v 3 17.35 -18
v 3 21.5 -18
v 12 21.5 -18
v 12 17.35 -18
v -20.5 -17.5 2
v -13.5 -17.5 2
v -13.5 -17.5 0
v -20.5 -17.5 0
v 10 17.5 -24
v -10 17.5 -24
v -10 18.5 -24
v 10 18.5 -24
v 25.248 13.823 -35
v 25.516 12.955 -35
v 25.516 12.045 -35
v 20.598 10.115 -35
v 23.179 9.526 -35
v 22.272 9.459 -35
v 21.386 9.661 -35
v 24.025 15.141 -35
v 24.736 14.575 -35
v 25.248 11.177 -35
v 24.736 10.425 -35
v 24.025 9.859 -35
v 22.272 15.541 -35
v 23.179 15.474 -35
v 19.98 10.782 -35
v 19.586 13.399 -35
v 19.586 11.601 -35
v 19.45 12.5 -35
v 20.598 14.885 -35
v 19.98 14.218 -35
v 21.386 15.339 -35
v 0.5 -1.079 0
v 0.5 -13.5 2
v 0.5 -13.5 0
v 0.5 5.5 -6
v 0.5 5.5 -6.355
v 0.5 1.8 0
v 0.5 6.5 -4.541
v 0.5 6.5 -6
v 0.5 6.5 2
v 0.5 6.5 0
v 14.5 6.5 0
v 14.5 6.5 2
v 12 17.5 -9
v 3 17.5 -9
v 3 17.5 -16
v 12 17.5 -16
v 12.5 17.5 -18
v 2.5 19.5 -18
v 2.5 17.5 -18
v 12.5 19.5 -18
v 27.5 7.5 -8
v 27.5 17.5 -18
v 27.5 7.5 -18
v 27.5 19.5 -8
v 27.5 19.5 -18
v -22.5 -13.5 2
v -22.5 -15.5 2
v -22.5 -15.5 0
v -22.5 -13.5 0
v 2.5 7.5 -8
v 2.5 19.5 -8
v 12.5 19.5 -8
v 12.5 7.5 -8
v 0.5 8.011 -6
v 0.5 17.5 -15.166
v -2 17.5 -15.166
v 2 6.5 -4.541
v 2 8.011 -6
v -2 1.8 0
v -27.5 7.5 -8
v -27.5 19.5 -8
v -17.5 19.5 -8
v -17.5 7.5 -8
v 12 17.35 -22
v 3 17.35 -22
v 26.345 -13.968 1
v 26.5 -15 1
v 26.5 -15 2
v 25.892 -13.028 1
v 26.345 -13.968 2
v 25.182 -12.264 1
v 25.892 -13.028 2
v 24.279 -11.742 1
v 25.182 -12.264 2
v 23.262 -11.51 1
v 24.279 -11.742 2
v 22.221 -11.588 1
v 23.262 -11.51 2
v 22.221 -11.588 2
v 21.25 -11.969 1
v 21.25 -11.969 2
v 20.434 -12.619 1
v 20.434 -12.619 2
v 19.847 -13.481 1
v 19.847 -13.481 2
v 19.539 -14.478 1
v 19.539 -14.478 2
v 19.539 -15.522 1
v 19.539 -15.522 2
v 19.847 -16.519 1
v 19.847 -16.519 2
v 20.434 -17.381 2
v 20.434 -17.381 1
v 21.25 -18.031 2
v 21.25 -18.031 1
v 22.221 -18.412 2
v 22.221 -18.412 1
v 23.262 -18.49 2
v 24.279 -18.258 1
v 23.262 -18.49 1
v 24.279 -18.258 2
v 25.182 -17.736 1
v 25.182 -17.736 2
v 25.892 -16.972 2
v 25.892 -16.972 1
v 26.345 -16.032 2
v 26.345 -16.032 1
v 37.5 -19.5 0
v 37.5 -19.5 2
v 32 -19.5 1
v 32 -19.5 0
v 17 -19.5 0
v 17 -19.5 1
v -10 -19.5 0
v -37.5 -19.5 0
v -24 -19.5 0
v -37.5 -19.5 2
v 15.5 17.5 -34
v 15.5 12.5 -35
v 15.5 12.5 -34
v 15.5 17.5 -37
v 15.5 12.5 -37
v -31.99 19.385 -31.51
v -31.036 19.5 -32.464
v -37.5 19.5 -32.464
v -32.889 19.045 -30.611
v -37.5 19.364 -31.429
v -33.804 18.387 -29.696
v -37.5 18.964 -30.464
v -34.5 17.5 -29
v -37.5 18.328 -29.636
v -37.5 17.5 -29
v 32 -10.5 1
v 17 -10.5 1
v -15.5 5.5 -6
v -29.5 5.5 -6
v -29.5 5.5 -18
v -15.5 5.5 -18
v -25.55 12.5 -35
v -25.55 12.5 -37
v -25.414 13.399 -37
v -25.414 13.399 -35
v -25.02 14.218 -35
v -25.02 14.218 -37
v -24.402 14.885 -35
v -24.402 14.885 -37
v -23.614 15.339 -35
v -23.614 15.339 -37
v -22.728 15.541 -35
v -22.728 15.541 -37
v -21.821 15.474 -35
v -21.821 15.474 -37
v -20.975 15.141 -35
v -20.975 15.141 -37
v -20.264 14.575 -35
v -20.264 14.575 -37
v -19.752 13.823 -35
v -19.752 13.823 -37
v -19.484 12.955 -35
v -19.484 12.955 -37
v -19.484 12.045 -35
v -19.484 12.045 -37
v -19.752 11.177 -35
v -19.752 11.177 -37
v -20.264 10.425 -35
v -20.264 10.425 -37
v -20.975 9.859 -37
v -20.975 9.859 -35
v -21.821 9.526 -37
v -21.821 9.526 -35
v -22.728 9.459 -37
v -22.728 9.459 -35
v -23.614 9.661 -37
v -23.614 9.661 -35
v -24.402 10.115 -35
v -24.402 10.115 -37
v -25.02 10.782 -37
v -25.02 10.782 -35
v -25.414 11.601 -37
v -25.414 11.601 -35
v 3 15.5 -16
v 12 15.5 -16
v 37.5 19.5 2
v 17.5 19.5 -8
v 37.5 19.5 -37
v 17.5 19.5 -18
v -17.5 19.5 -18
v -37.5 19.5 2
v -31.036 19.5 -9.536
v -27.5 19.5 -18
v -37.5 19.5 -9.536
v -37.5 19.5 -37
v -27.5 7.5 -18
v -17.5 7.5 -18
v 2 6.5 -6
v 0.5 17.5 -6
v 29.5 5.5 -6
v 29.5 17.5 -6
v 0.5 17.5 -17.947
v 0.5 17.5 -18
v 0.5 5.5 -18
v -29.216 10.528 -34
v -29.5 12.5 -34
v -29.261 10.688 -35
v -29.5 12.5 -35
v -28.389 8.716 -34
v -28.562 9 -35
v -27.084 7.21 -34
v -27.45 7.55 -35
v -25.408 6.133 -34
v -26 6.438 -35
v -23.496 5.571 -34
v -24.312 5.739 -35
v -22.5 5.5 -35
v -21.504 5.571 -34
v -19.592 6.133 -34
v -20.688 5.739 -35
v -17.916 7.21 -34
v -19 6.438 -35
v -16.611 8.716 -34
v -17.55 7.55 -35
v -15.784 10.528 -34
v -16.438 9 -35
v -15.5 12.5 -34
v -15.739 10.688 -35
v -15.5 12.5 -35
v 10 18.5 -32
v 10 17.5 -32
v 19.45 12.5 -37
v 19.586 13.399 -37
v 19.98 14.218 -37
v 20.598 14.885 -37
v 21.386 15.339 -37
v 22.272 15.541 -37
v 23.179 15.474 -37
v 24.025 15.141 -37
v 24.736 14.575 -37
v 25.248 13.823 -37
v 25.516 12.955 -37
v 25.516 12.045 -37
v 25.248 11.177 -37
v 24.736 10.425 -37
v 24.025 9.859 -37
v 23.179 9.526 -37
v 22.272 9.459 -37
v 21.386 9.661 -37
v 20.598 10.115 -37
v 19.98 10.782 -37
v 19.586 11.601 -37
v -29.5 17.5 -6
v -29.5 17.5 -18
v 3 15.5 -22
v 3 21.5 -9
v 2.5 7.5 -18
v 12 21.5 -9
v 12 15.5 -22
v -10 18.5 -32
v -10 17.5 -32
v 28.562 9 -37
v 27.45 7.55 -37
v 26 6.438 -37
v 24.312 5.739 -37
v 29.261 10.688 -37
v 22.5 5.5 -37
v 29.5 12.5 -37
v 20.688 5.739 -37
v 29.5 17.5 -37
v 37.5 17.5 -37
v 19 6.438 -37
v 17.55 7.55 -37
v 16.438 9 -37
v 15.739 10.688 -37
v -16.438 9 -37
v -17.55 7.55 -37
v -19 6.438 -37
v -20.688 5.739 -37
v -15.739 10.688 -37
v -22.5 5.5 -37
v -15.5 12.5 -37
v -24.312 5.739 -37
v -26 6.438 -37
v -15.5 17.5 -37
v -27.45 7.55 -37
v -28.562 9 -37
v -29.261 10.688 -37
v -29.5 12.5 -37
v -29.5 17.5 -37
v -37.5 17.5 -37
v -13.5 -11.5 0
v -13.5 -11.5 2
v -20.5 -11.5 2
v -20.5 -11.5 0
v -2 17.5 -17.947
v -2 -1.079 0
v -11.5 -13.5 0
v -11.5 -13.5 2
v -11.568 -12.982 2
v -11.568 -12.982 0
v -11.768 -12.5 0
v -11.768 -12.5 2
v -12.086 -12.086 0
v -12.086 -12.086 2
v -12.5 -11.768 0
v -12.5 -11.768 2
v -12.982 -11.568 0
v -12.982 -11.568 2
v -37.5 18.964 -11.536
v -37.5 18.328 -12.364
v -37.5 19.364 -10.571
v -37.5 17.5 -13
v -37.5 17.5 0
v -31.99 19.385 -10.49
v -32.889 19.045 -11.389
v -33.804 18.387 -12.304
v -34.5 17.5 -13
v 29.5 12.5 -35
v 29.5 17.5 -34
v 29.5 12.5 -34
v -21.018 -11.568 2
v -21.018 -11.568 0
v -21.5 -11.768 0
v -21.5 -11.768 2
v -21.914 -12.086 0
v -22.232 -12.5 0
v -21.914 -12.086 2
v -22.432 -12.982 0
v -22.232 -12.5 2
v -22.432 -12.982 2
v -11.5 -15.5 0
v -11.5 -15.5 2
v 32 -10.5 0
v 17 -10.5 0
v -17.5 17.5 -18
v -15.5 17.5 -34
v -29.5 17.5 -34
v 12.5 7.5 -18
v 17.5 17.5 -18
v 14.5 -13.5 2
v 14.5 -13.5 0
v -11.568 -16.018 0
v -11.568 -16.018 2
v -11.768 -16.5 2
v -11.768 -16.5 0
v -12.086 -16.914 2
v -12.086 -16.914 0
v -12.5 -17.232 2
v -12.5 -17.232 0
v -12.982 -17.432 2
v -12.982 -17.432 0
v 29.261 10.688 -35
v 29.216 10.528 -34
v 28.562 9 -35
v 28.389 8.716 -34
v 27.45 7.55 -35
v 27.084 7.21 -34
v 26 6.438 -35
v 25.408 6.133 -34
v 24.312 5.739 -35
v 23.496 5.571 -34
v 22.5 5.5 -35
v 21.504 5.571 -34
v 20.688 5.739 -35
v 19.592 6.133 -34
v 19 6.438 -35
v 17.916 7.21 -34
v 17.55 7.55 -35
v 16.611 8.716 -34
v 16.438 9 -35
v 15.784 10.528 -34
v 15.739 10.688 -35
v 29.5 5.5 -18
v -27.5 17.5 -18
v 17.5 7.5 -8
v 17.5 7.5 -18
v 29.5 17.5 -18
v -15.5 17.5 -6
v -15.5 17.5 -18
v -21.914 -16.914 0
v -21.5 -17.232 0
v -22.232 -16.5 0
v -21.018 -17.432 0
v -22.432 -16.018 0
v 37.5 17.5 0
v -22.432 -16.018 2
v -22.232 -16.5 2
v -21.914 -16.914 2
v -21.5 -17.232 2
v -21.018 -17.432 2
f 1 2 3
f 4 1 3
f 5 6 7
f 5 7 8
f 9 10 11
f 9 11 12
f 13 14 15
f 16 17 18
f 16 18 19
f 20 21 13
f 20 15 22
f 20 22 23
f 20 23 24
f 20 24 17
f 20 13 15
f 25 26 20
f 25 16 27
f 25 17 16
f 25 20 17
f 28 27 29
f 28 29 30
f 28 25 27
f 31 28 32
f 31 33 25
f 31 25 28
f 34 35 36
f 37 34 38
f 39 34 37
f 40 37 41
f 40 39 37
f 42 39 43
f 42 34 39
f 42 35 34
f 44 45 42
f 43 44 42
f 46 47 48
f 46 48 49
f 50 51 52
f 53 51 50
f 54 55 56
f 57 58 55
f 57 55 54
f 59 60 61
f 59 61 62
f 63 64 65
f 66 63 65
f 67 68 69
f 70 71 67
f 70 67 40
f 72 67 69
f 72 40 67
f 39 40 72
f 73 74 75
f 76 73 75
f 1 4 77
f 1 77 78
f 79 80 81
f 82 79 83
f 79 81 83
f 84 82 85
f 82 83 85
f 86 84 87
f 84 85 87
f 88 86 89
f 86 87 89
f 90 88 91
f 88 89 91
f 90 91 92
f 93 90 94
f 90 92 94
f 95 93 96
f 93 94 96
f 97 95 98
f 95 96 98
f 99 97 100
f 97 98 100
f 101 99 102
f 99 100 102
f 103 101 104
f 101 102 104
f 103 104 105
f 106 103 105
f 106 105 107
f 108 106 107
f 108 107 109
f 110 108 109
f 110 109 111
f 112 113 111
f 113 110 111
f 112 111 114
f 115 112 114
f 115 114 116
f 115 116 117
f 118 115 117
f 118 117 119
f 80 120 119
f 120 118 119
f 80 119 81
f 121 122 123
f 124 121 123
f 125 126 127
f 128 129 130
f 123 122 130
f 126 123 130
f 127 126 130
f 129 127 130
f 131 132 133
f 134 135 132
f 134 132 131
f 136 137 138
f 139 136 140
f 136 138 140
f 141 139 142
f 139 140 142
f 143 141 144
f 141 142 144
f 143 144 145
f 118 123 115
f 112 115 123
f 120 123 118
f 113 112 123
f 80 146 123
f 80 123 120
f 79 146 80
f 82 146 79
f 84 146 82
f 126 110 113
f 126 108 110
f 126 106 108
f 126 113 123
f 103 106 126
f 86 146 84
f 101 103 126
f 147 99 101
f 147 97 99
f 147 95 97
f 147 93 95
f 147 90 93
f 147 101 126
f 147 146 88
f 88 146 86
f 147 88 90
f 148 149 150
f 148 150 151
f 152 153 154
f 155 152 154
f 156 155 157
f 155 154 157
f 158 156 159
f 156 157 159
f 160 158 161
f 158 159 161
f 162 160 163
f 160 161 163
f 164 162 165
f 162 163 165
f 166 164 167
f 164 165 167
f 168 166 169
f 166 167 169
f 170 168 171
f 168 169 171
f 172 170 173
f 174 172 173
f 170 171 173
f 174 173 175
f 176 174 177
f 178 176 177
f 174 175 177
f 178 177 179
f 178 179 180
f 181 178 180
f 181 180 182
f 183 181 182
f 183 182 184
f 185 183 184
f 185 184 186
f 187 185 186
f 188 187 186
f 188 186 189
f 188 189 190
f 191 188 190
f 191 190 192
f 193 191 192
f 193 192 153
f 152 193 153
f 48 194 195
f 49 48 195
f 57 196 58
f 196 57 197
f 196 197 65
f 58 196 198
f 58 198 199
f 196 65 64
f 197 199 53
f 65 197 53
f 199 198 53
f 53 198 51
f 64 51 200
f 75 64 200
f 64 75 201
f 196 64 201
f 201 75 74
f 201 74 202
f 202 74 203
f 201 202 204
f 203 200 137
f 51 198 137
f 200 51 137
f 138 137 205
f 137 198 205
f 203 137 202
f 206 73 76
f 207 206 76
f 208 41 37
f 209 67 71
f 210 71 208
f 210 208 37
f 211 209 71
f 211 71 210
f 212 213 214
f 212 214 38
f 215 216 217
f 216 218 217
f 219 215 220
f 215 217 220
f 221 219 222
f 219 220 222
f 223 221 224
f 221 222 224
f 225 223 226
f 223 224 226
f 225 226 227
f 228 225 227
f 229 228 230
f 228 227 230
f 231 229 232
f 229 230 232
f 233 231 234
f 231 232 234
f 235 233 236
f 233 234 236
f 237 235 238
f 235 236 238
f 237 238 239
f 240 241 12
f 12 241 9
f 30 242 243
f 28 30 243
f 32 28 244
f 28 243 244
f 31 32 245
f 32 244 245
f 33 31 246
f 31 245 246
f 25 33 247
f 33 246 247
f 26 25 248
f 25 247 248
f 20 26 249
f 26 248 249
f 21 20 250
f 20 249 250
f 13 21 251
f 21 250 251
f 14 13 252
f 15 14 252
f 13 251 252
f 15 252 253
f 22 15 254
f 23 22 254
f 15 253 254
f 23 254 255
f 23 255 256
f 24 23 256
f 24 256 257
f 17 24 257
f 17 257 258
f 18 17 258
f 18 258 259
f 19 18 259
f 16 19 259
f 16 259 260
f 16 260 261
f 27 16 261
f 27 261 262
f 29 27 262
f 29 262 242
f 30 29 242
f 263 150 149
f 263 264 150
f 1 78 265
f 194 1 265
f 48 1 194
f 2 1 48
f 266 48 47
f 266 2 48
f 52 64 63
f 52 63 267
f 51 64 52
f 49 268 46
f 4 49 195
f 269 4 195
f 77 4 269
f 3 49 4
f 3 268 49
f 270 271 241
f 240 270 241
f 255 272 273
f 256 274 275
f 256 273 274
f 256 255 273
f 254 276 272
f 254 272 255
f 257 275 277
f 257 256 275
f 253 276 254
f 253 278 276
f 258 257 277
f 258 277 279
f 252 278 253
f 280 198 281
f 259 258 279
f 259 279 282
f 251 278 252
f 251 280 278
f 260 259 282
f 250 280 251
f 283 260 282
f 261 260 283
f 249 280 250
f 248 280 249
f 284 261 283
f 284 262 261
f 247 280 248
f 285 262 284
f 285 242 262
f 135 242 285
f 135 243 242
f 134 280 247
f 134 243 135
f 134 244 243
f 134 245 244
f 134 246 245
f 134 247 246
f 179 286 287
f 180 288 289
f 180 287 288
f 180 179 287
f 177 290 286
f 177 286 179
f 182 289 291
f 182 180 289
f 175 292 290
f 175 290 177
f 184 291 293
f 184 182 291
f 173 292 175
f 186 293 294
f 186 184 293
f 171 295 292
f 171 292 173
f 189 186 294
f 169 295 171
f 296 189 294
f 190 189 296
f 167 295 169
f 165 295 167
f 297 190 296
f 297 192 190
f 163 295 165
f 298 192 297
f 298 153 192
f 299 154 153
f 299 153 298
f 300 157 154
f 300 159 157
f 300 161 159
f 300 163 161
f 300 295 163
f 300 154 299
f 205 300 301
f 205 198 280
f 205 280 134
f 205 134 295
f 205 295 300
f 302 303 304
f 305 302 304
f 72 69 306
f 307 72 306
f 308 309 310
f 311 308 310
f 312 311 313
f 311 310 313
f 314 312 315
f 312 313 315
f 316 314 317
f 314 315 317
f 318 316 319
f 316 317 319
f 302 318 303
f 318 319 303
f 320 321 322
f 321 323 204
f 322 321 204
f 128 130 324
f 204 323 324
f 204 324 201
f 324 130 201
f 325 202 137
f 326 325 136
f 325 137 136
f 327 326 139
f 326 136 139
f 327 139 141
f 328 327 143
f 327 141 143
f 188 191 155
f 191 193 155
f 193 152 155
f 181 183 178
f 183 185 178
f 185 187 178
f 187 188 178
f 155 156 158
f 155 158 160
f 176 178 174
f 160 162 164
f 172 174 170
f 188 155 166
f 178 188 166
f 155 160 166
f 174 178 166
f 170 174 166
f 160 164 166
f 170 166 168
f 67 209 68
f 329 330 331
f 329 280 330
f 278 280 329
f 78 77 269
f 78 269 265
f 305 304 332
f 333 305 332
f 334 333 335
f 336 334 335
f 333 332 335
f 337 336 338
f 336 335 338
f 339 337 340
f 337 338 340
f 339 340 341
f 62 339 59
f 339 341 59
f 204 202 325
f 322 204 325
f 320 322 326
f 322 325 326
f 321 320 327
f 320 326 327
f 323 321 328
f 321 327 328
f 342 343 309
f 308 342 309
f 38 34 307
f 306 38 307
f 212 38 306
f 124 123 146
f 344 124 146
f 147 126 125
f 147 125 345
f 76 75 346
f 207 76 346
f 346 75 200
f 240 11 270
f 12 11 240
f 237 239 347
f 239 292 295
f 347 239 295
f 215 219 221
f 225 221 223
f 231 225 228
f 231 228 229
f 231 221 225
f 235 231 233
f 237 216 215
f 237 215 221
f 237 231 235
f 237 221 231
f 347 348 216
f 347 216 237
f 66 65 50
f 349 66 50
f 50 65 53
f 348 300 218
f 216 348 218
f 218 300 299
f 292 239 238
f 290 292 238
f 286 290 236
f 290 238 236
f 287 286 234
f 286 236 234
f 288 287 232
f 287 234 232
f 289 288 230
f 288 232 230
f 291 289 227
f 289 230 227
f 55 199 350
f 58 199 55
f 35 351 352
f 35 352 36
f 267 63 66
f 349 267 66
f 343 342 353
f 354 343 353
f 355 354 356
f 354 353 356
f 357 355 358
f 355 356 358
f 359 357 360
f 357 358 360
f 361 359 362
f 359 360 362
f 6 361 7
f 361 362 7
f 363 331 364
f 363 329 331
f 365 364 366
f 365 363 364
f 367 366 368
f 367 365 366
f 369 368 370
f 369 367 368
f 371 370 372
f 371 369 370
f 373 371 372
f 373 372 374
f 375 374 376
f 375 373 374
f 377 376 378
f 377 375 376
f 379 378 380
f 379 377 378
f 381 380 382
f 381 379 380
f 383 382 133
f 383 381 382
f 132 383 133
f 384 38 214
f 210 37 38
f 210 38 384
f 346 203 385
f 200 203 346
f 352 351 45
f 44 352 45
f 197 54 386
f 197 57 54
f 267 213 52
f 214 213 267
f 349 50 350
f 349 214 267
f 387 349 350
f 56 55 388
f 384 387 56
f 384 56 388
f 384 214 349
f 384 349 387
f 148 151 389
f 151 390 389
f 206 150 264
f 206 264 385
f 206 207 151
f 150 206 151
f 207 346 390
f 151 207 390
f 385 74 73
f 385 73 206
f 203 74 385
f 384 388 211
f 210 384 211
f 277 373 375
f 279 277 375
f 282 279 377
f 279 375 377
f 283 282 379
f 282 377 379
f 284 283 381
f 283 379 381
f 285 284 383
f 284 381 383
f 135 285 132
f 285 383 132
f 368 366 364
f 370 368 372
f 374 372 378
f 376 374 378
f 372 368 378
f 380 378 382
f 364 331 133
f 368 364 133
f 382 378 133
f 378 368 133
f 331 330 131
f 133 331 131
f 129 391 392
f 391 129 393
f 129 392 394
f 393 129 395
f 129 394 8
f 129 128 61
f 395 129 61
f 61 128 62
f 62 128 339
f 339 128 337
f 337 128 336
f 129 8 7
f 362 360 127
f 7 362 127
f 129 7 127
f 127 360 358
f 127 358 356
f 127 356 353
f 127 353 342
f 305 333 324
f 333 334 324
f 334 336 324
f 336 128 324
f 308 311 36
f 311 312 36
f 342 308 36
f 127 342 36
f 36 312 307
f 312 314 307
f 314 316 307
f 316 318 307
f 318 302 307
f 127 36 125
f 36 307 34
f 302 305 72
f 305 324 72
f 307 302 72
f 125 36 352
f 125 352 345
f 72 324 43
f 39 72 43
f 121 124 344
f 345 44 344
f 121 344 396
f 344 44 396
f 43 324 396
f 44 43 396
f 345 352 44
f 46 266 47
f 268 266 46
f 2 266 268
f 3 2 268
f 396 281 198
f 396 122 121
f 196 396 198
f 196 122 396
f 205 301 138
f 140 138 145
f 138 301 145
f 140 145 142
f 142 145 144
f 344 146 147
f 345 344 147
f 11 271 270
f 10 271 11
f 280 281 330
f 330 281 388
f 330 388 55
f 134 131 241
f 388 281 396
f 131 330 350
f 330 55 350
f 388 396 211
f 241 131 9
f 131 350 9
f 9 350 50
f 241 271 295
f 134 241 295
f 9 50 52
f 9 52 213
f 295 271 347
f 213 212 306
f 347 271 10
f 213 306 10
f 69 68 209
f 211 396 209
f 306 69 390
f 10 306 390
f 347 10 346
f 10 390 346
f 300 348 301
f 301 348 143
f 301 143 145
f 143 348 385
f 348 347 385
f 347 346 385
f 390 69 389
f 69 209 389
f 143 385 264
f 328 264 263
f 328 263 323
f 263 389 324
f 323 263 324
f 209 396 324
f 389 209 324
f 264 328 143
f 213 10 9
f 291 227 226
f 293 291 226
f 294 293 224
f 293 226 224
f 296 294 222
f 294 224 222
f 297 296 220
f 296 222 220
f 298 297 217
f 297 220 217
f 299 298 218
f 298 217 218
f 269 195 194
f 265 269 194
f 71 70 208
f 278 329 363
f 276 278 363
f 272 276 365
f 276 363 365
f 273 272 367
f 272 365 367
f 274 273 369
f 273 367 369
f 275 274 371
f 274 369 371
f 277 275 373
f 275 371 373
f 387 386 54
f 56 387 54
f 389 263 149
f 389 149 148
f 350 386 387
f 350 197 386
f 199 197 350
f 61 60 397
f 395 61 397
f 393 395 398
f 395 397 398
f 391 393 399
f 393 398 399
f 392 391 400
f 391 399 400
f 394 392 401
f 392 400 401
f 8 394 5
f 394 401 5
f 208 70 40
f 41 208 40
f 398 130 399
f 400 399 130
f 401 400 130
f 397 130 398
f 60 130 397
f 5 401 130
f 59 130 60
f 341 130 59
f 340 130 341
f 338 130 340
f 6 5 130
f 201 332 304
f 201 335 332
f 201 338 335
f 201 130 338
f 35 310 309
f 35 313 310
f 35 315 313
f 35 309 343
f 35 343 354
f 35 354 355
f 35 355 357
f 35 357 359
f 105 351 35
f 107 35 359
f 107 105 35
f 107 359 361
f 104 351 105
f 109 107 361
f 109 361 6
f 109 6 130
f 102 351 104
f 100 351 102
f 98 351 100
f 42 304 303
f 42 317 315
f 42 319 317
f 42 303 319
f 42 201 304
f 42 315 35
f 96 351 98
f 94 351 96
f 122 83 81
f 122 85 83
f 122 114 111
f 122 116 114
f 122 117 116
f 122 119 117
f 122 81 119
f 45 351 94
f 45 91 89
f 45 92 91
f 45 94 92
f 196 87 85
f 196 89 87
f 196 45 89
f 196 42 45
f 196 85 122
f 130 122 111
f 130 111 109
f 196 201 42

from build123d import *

# Parameters (mm, degrees)
SKETCH1_W                 = 75
SKETCH1_H                 = 39
BOSS_EXTRUDE1_DEPTH       = 2
SKETCH2_W                 = 75
SKETCH2_H                 = 2
BOSS_EXTRUDE2_DEPTH       = 38
SKETCH4_R                 = 3.5
SKETCH4_R_2               = 2.25
SKETCH4_W                 = 11
SKETCH4_H                 = 6
CUT_EXTRUDE1_DEPTH        = 2
SKETCH6_W                 = 10
SKETCH6_H                 = 10
CUT_EXTRUDE2_DEPTH        = 2
BOSS_EXTRUDE3_DEPTH       = 10
SKETCH8_W                 = 14
SKETCH8_H                 = 12
BOSS_EXTRUDE4_DEPTH       = 2
SKETCH9_W                 = 10
SKETCH9_H                 = 10
BOSS_EXTRUDE5_DEPTH       = 4
SKETCH10_W                = 9.9
SKETCH10_H                = 9.9
SKETCH10_W_2              = 5.9
SKETCH10_H_2              = 5.9
BOSS_EXTRUDE9_DEPTH       = 2
SKETCH11_W                = 9.9
SKETCH11_H                = 1.85
BOSS_EXTRUDE10_DEPTH      = 4
SKETCH12_R                = 4.25
SKETCH12_R_2              = 2.25
BOSS_EXTRUDE11_DEPTH      = 2
SKETCH16_W                = 14
SKETCH16_H                = 9.5
SKETCH16_W_2              = 11
SKETCH16_H_2              = 6
BOSS_EXTRUDE13_DEPTH      = 2
CUT_EXTRUDE3_DEPTH        = 65.955754172
FILLET1_R                 = 2
FILLET2_R                 = 2
BOSS_EXTRUDE14_DEPTH      = 2
BOSS_EXTRUDE14_DEPTH_BACK = 2
CUT_EXTRUDE4_DEPTH        = 7
CUT_EXTRUDE4_DEPTH_BACK   = 10
SKETCH19_W                = 14
SKETCH19_H                = 20
SKETCH22_W                = 14
SKETCH22_H                = 14
BOSS_EXTRUDE15_DEPTH      = 3
FILLET3_R                 = 7
SKETCH23_R                = 3.05
CUT_EXTRUDE6_DEPTH        = 4
SKETCH24_W                = 1
SKETCH24_H                = 12
BOSS_EXTRUDE16_DEPTH      = 12
SKETCH25_W                = 16.318850604
SKETCH25_H                = 8.975597068
SKETCH25_W_2              = 14
SKETCH25_H_2              = 9.692484115
CUT_EXTRUDE7_DEPTH        = 2
CUT_EXTRUDE8_START        = -2
SKETCH26_R                = 4.25
CUT_EXTRUDE8_DEPTH        = 2
SKETCH27_R                = 2.25
BOSS_EXTRUDE17_DEPTH      = 2
SKETCH28_W                = 85.525995753
SKETCH28_H                = 26.786934063
CUT_EXTRUDE9_DEPTH        = 1
BOSS_EXTRUDE18_DEPTH      = 1
CUT_EXTRUDE10_DEPTH       = 10
CUT_EXTRUDE11_START       = -1
SKETCH31_W                = 15
SKETCH31_H                = 9
SKETCH31_R                = 3.5
CUT_EXTRUDE11_DEPTH       = 1
SKETCH32_W                = 20
SKETCH32_H                = 8
CUT_EXTRUDE12_DEPTH       = 1
BOSS_EXTRUDE19_START      = -1
SKETCH34_W                = 14
SKETCH34_H                = 1
BOSS_EXTRUDE19_DEPTH      = 1
SKETCH35_W                = 3
SKETCH35_H                = 16
CUT_EXTRUDE13_DEPTH       = 66.545785524
FILLET4_R                 = 4
SKETCH36_W                = 0.4
SKETCH36_H                = 4
CUT_EXTRUDE14_DEPTH       = 10
SKETCH38_W                = 9.5
SKETCH38_H                = 7.5
CUT_EXTRUDE15_DEPTH       = 2
CUT_EXTRUDE16_DEPTH       = 10


# Some blends are built 0.0001 mm under size
with BuildPart() as part:
    # Sketch1 → Boss-Extrude1 (new body)
    with BuildSketch(Plane.XY):
        Rectangle(SKETCH1_W, SKETCH1_H)
    extrude(amount=BOSS_EXTRUDE1_DEPTH)

    # Sketch2 → Boss-Extrude2 (add)
    with BuildSketch(Plane(origin=(0, 0, 0), x_dir=(-1, 0, 0), z_dir=(0, 0, -1))):
        with Locations((0, 18.5)):
            Rectangle(SKETCH2_W, SKETCH2_H)
    extrude(amount=BOSS_EXTRUDE2_DEPTH)

    # Sketch4 → Cut-Extrude1 (cut)
    with BuildSketch(Plane.XY.offset(2)):
        with Locations((23, -15)):
            Circle(SKETCH4_R)
        with Locations((23, 4.5)):
            Circle(SKETCH4_R_2)
        with Locations((-17, -14.5)):
            Rectangle(SKETCH4_W, SKETCH4_H)
    extrude(amount=-CUT_EXTRUDE1_DEPTH, mode=Mode.SUBTRACT)

    # Sketch6 → Cut-Extrude2 (cut)
    with BuildSketch(Plane(origin=(0, 19.5, 0), x_dir=(1, 0, 0), z_dir=(0, 1, 0))):
        with Locations((7.5, 13)):
            Rectangle(SKETCH6_W, SKETCH6_H)
        with Locations((22.5, 13)):
            Rectangle(SKETCH6_W, SKETCH6_H)
        with Locations((-22.5, 13)):
            Rectangle(SKETCH6_W, SKETCH6_H)
    extrude(amount=-CUT_EXTRUDE2_DEPTH, mode=Mode.SUBTRACT)

    # Sketch7 → Boss-Extrude3 (add)
    with BuildSketch(Plane.XZ.offset(-17.5)):
        Polygon((17.5, -8), (17.5, -18), (15.5, -18), (15.5, -8), (15.5, -6), (29.5, -6), (29.5, -8), (29.5, -18), (27.5, -18), (27.5, -8), align=None)
        Polygon((2.5, -8), (2.5, -18), (0.5, -18), (0.5, -8), (0.5, -6), (14.5, -6), (14.5, -8), (14.5, -18), (12.5, -18), (12.5, -8), align=None)
        Polygon((-17.5, -8), (-17.5, -18), (-15.5, -18), (-15.5, -8), (-15.5, -6), (-29.5, -6), (-29.5, -8), (-29.5, -18), (-27.5, -18), (-27.5, -8), align=None)
    extrude(amount=BOSS_EXTRUDE3_DEPTH)

    # Sketch8 → Boss-Extrude4 (add)
    with BuildSketch(Plane.XZ.offset(-7.5)):
        with Locations((-22.5, -12)):
            Rectangle(SKETCH8_W, SKETCH8_H)
        with Locations((7.5, -12)):
            Rectangle(SKETCH8_W, SKETCH8_H)
        with Locations((22.5, -12)):
            Rectangle(SKETCH8_W, SKETCH8_H)
    extrude(amount=BOSS_EXTRUDE4_DEPTH)

    # Sketch12 → Boss-Extrude11 (add)
    with BuildSketch(Plane(origin=(0, 0, 0), x_dir=(-1, 0, 0), z_dir=(0, 0, -1))):
        with Locations(Location((-23, 4.5, 0), (0, 0, 180))):
            Circle(SKETCH12_R)
        with Locations(Location((-23, 4.5, 0), (0, 0, 180))):
            Circle(SKETCH12_R_2, mode=Mode.SUBTRACT)
    extrude(amount=BOSS_EXTRUDE11_DEPTH)

    # Sketch16 → Boss-Extrude13 (add)
    with BuildSketch(Plane(origin=(0, 0, 0), x_dir=(-1, 0, 0), z_dir=(0, 0, -1))):
        with Locations((17, -14.75)):
            Rectangle(SKETCH16_W, SKETCH16_H)
        with Locations((17, -14.5)):
            Rectangle(SKETCH16_W_2, SKETCH16_H_2, mode=Mode.SUBTRACT)
    extrude(amount=BOSS_EXTRUDE13_DEPTH)

    # Fillet1
    fillet1_edges = [part.edges().sort_by_distance(p)[0] for p in [
        (-22.5, -17.5, 0),
        (-22.5, -11.5, 0),
        (-11.5, -11.5, 0),
        (-11.5, -17.5, 0),
    ]]
    fillet(fillet1_edges, radius=FILLET1_R)

    # Fillet2
    fillet2_edges = [part.edges().sort_by_distance(p)[0] for p in [
        (-10, -10, -1),
        (-24, -10, -1),
    ]]
    fillet(fillet2_edges, radius=FILLET2_R)

    # Sketch18 → Boss-Extrude14 (add, two sides: drawn at the far end of the back side and taken through both)
    with BuildSketch(Plane.ZY.offset(-BOSS_EXTRUDE14_DEPTH_BACK)):
        Polygon((-15.16634768, 17.5), (0, 1.799618541), (0, -1.079036274), (-17.947087746, 17.5), align=None)
    extrude(amount=BOSS_EXTRUDE14_DEPTH + BOSS_EXTRUDE14_DEPTH_BACK)

    # Sketch19 → Cut-Extrude4 (cut, two sides: drawn at the far end of the back side and taken through both)
    with BuildSketch(Plane(origin=(0, 0, 0), x_dir=(-1, 0, 0), z_dir=(0, 0, -1)).offset(-CUT_EXTRUDE4_DEPTH_BACK)):
        with Locations((-7.5, -3.5)):
            Rectangle(SKETCH19_W, SKETCH19_H)
    extrude(amount=CUT_EXTRUDE4_DEPTH + CUT_EXTRUDE4_DEPTH_BACK, mode=Mode.SUBTRACT)

    # Sketch22 → Boss-Extrude15 (add)
    with BuildSketch(Plane(origin=(0, 0, -38), x_dir=(-1, 0, 0), z_dir=(0, 0, -1))):
        with Locations((-22.5, 12.5)):
            Rectangle(SKETCH22_W, SKETCH22_H)
        with Locations((22.5, 12.5)):
            Rectangle(SKETCH22_W, SKETCH22_H)
    extrude(amount=-BOSS_EXTRUDE15_DEPTH)

    # Fillet3
    fillet3_edges = [part.edges().sort_by_distance(p)[0] for p in [
        (-29.5, 5.5, -36.5),
        (-15.5, 5.5, -36.5),
        (15.5, 5.5, -36.5),
        (29.5, 5.5, -36.5),
    ]]
    fillet(fillet3_edges, radius=FILLET3_R - 0.0001)  # a hair under: the kernel refuses the full size

    # Sketch23 → Cut-Extrude6 (cut)
    with BuildSketch(Plane(origin=(0, 0, -38), x_dir=(-1, 0, 0), z_dir=(0, 0, -1))):
        with Locations((-22.5, 12.5)):
            Circle(SKETCH23_R)
        with Locations((22.5, 12.5)):
            Circle(SKETCH23_R)
    extrude(amount=-CUT_EXTRUDE6_DEPTH, mode=Mode.SUBTRACT)

    # Sketch24 → Boss-Extrude16 (add)
    with BuildSketch(Plane.XZ.offset(-5.5)):
        with Locations((15, -12)):
            Rectangle(SKETCH24_W, SKETCH24_H)
    extrude(amount=-BOSS_EXTRUDE16_DEPTH)

    # Sketch25 → Cut-Extrude7 (cut)
    with BuildSketch(Plane(origin=(0, 0, -2), x_dir=(-1, 0, 0), z_dir=(0, 0, -1))):
        with Locations((-23, -15)):
            Rectangle(SKETCH25_W, SKETCH25_H)
        with Locations((17, -14.653757943)):
            Rectangle(SKETCH25_W_2, SKETCH25_H_2)
    extrude(amount=-CUT_EXTRUDE7_DEPTH, mode=Mode.SUBTRACT)

    # Sketch26 → Cut-Extrude8 (cut)
    with BuildSketch(Plane(origin=(0, 0, -2), x_dir=(-1, 0, 0), z_dir=(0, 0, -1)).offset(CUT_EXTRUDE8_START)):
        with Locations((-23, 4.5)):
            Circle(SKETCH26_R)
    extrude(amount=CUT_EXTRUDE8_DEPTH, mode=Mode.SUBTRACT)

    # Sketch27 → Boss-Extrude17 (add)
    with BuildSketch(Plane.XY.offset(2)):
        with Locations((23, 4.5)):
            Circle(SKETCH27_R)
    extrude(amount=-BOSS_EXTRUDE17_DEPTH)

    # Sketch28 → Cut-Extrude9 (cut)
    with BuildSketch(Plane(origin=(0, 0, -38), x_dir=(-1, 0, 0), z_dir=(0, 0, -1))):
        with Locations((0.270543114, 11.591218851)):
            Rectangle(SKETCH28_W, SKETCH28_H)
    extrude(amount=-CUT_EXTRUDE9_DEPTH, mode=Mode.SUBTRACT)

    # Sketch29 → Boss-Extrude18 (add)
    with BuildSketch(Plane.XY.offset(-35)):
        with BuildLine():
            Line((15.5, 17.5), (29.5, 17.5))
            Line((29.5, 17.5), (29.5, 12.5))
            ThreePointArc((29.5, 12.5), (22.5, 5.5), (15.5, 12.5))
            Line((15.5, 12.5), (15.5, 17.5))
        make_face()
    boss_extrude18 = extrude(amount=BOSS_EXTRUDE18_DEPTH)

    # Mirror1: Boss-Extrude18 across plane
    add(boss_extrude18.mirror(Plane.ZY))

    # Sketch31 → Cut-Extrude11 (cut)
    with BuildSketch(Plane(origin=(0, 0, 0), x_dir=(-1, 0, 0), z_dir=(0, 0, -1)).offset(CUT_EXTRUDE11_START)):
        with Locations((-24.5, -15)):
            Rectangle(SKETCH31_W, SKETCH31_H)
        with Locations(Location((-23, -15, 0), (0, 0, 180))):
            Circle(SKETCH31_R, mode=Mode.SUBTRACT)
    extrude(amount=CUT_EXTRUDE11_DEPTH, mode=Mode.SUBTRACT)

    # Sketch32 → Cut-Extrude12 (cut)
    with BuildSketch(Plane.XZ.offset(-17.5)):
        with Locations((0, -28)):
            Rectangle(SKETCH32_W, SKETCH32_H)
    extrude(amount=-CUT_EXTRUDE12_DEPTH, mode=Mode.SUBTRACT)

    # Sketch34 → Boss-Extrude19 (add)
    with BuildSketch(Plane.XZ.offset(-5.5).offset(BOSS_EXTRUDE19_START)):
        with Locations((7.5, -6.5)):
            Rectangle(SKETCH34_W, SKETCH34_H)
    extrude(amount=BOSS_EXTRUDE19_DEPTH)

    # Sketch35 → Cut-Extrude13 (cut, through all)
    with BuildSketch(Plane(origin=(0, 19.5, 0), x_dir=(1, 0, 0), z_dir=(0, 1, 0))):
        with Locations((-36, 21)):
            Rectangle(SKETCH35_W, SKETCH35_H)
    extrude(amount=-CUT_EXTRUDE13_DEPTH, mode=Mode.SUBTRACT)

    # Fillet4
    # the kernel refuses this fillet: 4 mm, written as the material it takes off along each edge
    with BuildSketch(Plane(origin=(-34.5, 19.5, -13), x_dir=(0, 0, 1), z_dir=(-1, 0, 0)), Plane(origin=(-46.160254038, 19.5, -29), x_dir=(0, 0, -1), z_dir=(1, 0, 0))) as fillet4_piece_1:
        with BuildLine():
            CenterArc((3.464101615, -4), FILLET4_R, 90, 60)
            Line((0, -2), (-0.069282032, -1.96))
            ThreePointArc((-0.069282032, -1.96), (-0.08, -1), (-0.08, 0))
            Line((-0.08, 0), (0, 0.08))
            Line((0, 0.08), (3.464101615, 0.08))
            Line((3.464101615, 0.08), (3.464101615, 0))
        make_face()
    extrude(amount=11.660254038, mode=Mode.SUBTRACT)
    with BuildSketch(Plane(origin=(-34.5, 19.5, -29), x_dir=(1, 0, 0), z_dir=(0, 0, 1))) as fillet4_piece_2:
        with BuildLine():
            CenterArc((3.464101615, -4), FILLET4_R, 90, 60)
            Line((0, -2), (-0.069282032, -1.96))
            ThreePointArc((-0.069282032, -1.96), (-0.08, -1), (-0.08, 0))
            Line((-0.08, 0), (0, 0.08))
            Line((0, 0.08), (3.464101615, 0.08))
            Line((3.464101615, 0.08), (3.464101615, 0))
        make_face()
    extrude(amount=16, mode=Mode.SUBTRACT)
    with BuildSketch(Plane(origin=(-25.839745962, 19.5, -13), x_dir=(0, 0, 1), z_dir=(-1, 0, 0))) as fillet4_piece_3a_section:
        with BuildLine():
            CenterArc((3.464101615, -4), FILLET4_R, 90, 60)
            Line((0, -2), (-0.069282032, -1.96))
            ThreePointArc((-0.069282032, -1.96), (-0.08, -1), (-0.08, 0))
            Line((-0.08, 0), (0, 0.08))
            Line((0, 0.08), (3.464101615, 0.08))
            Line((3.464101615, 0.08), (3.464101615, 0))
        make_face()
    fillet4_piece_3a = extrude(amount=20.320508076, mode=Mode.PRIVATE)
    fillet4_piece_3a = split(fillet4_piece_3a, bisect_by=Plane(origin=(-34.5, 18.981933156, -12.134758217), z_dir=(1, 0, 0)), keep=Keep.TOP, mode=Mode.PRIVATE)
    with BuildSketch(Plane(origin=(-34.5, 19.5, -29), x_dir=(1, 0, 0), z_dir=(0, 0, 1))) as fillet4_piece_3b_section:
        with BuildLine():
            CenterArc((3.464101615, -4), FILLET4_R, 90, 60)
            Line((0, -2), (-0.069282032, -1.96))
            ThreePointArc((-0.069282032, -1.96), (-0.08, -1), (-0.08, 0))
            Line((-0.08, 0), (0, 0.08))
            Line((0, 0.08), (3.464101615, 0.08))
            Line((3.464101615, 0.08), (3.464101615, 0))
        make_face()
    fillet4_piece_3b = extrude(amount=24.660254038, mode=Mode.PRIVATE)
    fillet4_piece_3b = split(fillet4_piece_3b, bisect_by=Plane(origin=(-33.634758217, 18.981933156, -13), z_dir=(0, 0, 1)), keep=Keep.TOP, mode=Mode.PRIVATE)
    fillet4_piece_3 = fillet4_piece_3a & fillet4_piece_3b
    add(fillet4_piece_3, mode=Mode.SUBTRACT)
    with BuildSketch(Plane(origin=(-34.5, 19.5, -37.660254038), x_dir=(1, 0, 0), z_dir=(0, 0, 1))) as fillet4_piece_4a_section:
        with BuildLine():
            CenterArc((3.464101615, -4), FILLET4_R, 90, 60)
            Line((0, -2), (-0.069282032, -1.96))
            ThreePointArc((-0.069282032, -1.96), (-0.08, -1), (-0.08, 0))
            Line((-0.08, 0), (0, 0.08))
            Line((0, 0.08), (3.464101615, 0.08))
            Line((3.464101615, 0.08), (3.464101615, 0))
        make_face()
    fillet4_piece_4a = extrude(amount=24.660254038, mode=Mode.PRIVATE)
    fillet4_piece_4a = split(fillet4_piece_4a, bisect_by=Plane(origin=(-33.634758217, 18.981933156, -29), z_dir=(0, 0, -1)), keep=Keep.TOP, mode=Mode.PRIVATE)
    with BuildSketch(Plane(origin=(-46.160254038, 19.5, -29), x_dir=(0, 0, -1), z_dir=(1, 0, 0))) as fillet4_piece_4b_section:
        with BuildLine():
            CenterArc((3.464101615, -4), FILLET4_R, 90, 60)
            Line((0, -2), (-0.069282032, -1.96))
            ThreePointArc((-0.069282032, -1.96), (-0.08, -1), (-0.08, 0))
            Line((-0.08, 0), (0, 0.08))
            Line((0, 0.08), (3.464101615, 0.08))
            Line((3.464101615, 0.08), (3.464101615, 0))
        make_face()
    fillet4_piece_4b = extrude(amount=20.320508076, mode=Mode.PRIVATE)
    fillet4_piece_4b = split(fillet4_piece_4b, bisect_by=Plane(origin=(-34.5, 18.981933156, -29.865241783), z_dir=(1, 0, 0)), keep=Keep.TOP, mode=Mode.PRIVATE)
    fillet4_piece_4 = fillet4_piece_4a & fillet4_piece_4b
    add(fillet4_piece_4, mode=Mode.SUBTRACT)


with BuildPart() as body_2:
    # Sketch9 → Boss-Extrude5 (new body)
    with BuildSketch(Plane.XZ.offset(-17.5)):
        with Locations((7.5, -13)):
            Rectangle(SKETCH9_W, SKETCH9_H)
    extrude(amount=-BOSS_EXTRUDE5_DEPTH)

    # Sketch10 → Boss-Extrude9 (add)
    with BuildSketch(Plane.XZ.offset(-17.5)):
        with Locations((7.55, -13.05)):
            Rectangle(SKETCH10_W, SKETCH10_H)
        with Locations((7.55, -13.05)):
            Rectangle(SKETCH10_W_2, SKETCH10_H_2, mode=Mode.SUBTRACT)
    extrude(amount=BOSS_EXTRUDE9_DEPTH)

    # Sketch11 → Boss-Extrude10 (add)
    with BuildSketch(Plane(origin=(0, 0, -18), x_dir=(-1, 0, 0), z_dir=(0, 0, -1))):
        with Locations((-7.55, 16.425)):
            Rectangle(SKETCH11_W, SKETCH11_H)
    extrude(amount=BOSS_EXTRUDE10_DEPTH)

    # Sketch17 → Cut-Extrude3 (cut, through all)
    with BuildSketch(Plane.XZ.offset(-17.5)):
        Polygon((2.5, -8.1), (2.5, -18), (2.6, -18), (2.6, -8.1), (12.5, -8.1), (12.5, -8), (2.6, -8), (2.5, -8), align=None)
    extrude(amount=-CUT_EXTRUDE3_DEPTH, mode=Mode.SUBTRACT)

    # Sketch30 → Cut-Extrude10 (cut)
    with BuildSketch(Plane(origin=(0, 21.5, 0), x_dir=(1, 0, 0), z_dir=(0, 1, 0))):
        Polygon((2.5, 18), (3, 18), (3, 8.5), (12.5, 8.5), (12.5, 8), (2.5, 8), align=None)
    extrude(amount=-CUT_EXTRUDE10_DEPTH, mode=Mode.SUBTRACT)

    # Sketch36 → Cut-Extrude14 (cut)
    with BuildSketch(Plane.XZ.offset(-15.5)):
        with Locations((2.8, -20)):
            Rectangle(SKETCH36_W, SKETCH36_H)
    extrude(amount=-CUT_EXTRUDE14_DEPTH, mode=Mode.SUBTRACT)

    # Sketch38 → Cut-Extrude15 (cut)
    with BuildSketch(Plane.XZ.offset(-15.5)):
        with Locations((7.75, -12.25)):
            Rectangle(SKETCH38_W, SKETCH38_H)
    extrude(amount=-CUT_EXTRUDE15_DEPTH, mode=Mode.SUBTRACT)

    # Sketch39 → Cut-Extrude16 (cut)
    with BuildSketch(Plane(origin=(0, 21.5, 0), x_dir=(1, 0, 0), z_dir=(0, 1, 0))):
        Polygon((12.5, 8.5), (3, 8.5), (3, 9), (12, 9), (12, 22), (12.5, 22), align=None)
    extrude(amount=-CUT_EXTRUDE16_DEPTH, mode=Mode.SUBTRACT)


solid = Compound([part.part, body_2.part])
